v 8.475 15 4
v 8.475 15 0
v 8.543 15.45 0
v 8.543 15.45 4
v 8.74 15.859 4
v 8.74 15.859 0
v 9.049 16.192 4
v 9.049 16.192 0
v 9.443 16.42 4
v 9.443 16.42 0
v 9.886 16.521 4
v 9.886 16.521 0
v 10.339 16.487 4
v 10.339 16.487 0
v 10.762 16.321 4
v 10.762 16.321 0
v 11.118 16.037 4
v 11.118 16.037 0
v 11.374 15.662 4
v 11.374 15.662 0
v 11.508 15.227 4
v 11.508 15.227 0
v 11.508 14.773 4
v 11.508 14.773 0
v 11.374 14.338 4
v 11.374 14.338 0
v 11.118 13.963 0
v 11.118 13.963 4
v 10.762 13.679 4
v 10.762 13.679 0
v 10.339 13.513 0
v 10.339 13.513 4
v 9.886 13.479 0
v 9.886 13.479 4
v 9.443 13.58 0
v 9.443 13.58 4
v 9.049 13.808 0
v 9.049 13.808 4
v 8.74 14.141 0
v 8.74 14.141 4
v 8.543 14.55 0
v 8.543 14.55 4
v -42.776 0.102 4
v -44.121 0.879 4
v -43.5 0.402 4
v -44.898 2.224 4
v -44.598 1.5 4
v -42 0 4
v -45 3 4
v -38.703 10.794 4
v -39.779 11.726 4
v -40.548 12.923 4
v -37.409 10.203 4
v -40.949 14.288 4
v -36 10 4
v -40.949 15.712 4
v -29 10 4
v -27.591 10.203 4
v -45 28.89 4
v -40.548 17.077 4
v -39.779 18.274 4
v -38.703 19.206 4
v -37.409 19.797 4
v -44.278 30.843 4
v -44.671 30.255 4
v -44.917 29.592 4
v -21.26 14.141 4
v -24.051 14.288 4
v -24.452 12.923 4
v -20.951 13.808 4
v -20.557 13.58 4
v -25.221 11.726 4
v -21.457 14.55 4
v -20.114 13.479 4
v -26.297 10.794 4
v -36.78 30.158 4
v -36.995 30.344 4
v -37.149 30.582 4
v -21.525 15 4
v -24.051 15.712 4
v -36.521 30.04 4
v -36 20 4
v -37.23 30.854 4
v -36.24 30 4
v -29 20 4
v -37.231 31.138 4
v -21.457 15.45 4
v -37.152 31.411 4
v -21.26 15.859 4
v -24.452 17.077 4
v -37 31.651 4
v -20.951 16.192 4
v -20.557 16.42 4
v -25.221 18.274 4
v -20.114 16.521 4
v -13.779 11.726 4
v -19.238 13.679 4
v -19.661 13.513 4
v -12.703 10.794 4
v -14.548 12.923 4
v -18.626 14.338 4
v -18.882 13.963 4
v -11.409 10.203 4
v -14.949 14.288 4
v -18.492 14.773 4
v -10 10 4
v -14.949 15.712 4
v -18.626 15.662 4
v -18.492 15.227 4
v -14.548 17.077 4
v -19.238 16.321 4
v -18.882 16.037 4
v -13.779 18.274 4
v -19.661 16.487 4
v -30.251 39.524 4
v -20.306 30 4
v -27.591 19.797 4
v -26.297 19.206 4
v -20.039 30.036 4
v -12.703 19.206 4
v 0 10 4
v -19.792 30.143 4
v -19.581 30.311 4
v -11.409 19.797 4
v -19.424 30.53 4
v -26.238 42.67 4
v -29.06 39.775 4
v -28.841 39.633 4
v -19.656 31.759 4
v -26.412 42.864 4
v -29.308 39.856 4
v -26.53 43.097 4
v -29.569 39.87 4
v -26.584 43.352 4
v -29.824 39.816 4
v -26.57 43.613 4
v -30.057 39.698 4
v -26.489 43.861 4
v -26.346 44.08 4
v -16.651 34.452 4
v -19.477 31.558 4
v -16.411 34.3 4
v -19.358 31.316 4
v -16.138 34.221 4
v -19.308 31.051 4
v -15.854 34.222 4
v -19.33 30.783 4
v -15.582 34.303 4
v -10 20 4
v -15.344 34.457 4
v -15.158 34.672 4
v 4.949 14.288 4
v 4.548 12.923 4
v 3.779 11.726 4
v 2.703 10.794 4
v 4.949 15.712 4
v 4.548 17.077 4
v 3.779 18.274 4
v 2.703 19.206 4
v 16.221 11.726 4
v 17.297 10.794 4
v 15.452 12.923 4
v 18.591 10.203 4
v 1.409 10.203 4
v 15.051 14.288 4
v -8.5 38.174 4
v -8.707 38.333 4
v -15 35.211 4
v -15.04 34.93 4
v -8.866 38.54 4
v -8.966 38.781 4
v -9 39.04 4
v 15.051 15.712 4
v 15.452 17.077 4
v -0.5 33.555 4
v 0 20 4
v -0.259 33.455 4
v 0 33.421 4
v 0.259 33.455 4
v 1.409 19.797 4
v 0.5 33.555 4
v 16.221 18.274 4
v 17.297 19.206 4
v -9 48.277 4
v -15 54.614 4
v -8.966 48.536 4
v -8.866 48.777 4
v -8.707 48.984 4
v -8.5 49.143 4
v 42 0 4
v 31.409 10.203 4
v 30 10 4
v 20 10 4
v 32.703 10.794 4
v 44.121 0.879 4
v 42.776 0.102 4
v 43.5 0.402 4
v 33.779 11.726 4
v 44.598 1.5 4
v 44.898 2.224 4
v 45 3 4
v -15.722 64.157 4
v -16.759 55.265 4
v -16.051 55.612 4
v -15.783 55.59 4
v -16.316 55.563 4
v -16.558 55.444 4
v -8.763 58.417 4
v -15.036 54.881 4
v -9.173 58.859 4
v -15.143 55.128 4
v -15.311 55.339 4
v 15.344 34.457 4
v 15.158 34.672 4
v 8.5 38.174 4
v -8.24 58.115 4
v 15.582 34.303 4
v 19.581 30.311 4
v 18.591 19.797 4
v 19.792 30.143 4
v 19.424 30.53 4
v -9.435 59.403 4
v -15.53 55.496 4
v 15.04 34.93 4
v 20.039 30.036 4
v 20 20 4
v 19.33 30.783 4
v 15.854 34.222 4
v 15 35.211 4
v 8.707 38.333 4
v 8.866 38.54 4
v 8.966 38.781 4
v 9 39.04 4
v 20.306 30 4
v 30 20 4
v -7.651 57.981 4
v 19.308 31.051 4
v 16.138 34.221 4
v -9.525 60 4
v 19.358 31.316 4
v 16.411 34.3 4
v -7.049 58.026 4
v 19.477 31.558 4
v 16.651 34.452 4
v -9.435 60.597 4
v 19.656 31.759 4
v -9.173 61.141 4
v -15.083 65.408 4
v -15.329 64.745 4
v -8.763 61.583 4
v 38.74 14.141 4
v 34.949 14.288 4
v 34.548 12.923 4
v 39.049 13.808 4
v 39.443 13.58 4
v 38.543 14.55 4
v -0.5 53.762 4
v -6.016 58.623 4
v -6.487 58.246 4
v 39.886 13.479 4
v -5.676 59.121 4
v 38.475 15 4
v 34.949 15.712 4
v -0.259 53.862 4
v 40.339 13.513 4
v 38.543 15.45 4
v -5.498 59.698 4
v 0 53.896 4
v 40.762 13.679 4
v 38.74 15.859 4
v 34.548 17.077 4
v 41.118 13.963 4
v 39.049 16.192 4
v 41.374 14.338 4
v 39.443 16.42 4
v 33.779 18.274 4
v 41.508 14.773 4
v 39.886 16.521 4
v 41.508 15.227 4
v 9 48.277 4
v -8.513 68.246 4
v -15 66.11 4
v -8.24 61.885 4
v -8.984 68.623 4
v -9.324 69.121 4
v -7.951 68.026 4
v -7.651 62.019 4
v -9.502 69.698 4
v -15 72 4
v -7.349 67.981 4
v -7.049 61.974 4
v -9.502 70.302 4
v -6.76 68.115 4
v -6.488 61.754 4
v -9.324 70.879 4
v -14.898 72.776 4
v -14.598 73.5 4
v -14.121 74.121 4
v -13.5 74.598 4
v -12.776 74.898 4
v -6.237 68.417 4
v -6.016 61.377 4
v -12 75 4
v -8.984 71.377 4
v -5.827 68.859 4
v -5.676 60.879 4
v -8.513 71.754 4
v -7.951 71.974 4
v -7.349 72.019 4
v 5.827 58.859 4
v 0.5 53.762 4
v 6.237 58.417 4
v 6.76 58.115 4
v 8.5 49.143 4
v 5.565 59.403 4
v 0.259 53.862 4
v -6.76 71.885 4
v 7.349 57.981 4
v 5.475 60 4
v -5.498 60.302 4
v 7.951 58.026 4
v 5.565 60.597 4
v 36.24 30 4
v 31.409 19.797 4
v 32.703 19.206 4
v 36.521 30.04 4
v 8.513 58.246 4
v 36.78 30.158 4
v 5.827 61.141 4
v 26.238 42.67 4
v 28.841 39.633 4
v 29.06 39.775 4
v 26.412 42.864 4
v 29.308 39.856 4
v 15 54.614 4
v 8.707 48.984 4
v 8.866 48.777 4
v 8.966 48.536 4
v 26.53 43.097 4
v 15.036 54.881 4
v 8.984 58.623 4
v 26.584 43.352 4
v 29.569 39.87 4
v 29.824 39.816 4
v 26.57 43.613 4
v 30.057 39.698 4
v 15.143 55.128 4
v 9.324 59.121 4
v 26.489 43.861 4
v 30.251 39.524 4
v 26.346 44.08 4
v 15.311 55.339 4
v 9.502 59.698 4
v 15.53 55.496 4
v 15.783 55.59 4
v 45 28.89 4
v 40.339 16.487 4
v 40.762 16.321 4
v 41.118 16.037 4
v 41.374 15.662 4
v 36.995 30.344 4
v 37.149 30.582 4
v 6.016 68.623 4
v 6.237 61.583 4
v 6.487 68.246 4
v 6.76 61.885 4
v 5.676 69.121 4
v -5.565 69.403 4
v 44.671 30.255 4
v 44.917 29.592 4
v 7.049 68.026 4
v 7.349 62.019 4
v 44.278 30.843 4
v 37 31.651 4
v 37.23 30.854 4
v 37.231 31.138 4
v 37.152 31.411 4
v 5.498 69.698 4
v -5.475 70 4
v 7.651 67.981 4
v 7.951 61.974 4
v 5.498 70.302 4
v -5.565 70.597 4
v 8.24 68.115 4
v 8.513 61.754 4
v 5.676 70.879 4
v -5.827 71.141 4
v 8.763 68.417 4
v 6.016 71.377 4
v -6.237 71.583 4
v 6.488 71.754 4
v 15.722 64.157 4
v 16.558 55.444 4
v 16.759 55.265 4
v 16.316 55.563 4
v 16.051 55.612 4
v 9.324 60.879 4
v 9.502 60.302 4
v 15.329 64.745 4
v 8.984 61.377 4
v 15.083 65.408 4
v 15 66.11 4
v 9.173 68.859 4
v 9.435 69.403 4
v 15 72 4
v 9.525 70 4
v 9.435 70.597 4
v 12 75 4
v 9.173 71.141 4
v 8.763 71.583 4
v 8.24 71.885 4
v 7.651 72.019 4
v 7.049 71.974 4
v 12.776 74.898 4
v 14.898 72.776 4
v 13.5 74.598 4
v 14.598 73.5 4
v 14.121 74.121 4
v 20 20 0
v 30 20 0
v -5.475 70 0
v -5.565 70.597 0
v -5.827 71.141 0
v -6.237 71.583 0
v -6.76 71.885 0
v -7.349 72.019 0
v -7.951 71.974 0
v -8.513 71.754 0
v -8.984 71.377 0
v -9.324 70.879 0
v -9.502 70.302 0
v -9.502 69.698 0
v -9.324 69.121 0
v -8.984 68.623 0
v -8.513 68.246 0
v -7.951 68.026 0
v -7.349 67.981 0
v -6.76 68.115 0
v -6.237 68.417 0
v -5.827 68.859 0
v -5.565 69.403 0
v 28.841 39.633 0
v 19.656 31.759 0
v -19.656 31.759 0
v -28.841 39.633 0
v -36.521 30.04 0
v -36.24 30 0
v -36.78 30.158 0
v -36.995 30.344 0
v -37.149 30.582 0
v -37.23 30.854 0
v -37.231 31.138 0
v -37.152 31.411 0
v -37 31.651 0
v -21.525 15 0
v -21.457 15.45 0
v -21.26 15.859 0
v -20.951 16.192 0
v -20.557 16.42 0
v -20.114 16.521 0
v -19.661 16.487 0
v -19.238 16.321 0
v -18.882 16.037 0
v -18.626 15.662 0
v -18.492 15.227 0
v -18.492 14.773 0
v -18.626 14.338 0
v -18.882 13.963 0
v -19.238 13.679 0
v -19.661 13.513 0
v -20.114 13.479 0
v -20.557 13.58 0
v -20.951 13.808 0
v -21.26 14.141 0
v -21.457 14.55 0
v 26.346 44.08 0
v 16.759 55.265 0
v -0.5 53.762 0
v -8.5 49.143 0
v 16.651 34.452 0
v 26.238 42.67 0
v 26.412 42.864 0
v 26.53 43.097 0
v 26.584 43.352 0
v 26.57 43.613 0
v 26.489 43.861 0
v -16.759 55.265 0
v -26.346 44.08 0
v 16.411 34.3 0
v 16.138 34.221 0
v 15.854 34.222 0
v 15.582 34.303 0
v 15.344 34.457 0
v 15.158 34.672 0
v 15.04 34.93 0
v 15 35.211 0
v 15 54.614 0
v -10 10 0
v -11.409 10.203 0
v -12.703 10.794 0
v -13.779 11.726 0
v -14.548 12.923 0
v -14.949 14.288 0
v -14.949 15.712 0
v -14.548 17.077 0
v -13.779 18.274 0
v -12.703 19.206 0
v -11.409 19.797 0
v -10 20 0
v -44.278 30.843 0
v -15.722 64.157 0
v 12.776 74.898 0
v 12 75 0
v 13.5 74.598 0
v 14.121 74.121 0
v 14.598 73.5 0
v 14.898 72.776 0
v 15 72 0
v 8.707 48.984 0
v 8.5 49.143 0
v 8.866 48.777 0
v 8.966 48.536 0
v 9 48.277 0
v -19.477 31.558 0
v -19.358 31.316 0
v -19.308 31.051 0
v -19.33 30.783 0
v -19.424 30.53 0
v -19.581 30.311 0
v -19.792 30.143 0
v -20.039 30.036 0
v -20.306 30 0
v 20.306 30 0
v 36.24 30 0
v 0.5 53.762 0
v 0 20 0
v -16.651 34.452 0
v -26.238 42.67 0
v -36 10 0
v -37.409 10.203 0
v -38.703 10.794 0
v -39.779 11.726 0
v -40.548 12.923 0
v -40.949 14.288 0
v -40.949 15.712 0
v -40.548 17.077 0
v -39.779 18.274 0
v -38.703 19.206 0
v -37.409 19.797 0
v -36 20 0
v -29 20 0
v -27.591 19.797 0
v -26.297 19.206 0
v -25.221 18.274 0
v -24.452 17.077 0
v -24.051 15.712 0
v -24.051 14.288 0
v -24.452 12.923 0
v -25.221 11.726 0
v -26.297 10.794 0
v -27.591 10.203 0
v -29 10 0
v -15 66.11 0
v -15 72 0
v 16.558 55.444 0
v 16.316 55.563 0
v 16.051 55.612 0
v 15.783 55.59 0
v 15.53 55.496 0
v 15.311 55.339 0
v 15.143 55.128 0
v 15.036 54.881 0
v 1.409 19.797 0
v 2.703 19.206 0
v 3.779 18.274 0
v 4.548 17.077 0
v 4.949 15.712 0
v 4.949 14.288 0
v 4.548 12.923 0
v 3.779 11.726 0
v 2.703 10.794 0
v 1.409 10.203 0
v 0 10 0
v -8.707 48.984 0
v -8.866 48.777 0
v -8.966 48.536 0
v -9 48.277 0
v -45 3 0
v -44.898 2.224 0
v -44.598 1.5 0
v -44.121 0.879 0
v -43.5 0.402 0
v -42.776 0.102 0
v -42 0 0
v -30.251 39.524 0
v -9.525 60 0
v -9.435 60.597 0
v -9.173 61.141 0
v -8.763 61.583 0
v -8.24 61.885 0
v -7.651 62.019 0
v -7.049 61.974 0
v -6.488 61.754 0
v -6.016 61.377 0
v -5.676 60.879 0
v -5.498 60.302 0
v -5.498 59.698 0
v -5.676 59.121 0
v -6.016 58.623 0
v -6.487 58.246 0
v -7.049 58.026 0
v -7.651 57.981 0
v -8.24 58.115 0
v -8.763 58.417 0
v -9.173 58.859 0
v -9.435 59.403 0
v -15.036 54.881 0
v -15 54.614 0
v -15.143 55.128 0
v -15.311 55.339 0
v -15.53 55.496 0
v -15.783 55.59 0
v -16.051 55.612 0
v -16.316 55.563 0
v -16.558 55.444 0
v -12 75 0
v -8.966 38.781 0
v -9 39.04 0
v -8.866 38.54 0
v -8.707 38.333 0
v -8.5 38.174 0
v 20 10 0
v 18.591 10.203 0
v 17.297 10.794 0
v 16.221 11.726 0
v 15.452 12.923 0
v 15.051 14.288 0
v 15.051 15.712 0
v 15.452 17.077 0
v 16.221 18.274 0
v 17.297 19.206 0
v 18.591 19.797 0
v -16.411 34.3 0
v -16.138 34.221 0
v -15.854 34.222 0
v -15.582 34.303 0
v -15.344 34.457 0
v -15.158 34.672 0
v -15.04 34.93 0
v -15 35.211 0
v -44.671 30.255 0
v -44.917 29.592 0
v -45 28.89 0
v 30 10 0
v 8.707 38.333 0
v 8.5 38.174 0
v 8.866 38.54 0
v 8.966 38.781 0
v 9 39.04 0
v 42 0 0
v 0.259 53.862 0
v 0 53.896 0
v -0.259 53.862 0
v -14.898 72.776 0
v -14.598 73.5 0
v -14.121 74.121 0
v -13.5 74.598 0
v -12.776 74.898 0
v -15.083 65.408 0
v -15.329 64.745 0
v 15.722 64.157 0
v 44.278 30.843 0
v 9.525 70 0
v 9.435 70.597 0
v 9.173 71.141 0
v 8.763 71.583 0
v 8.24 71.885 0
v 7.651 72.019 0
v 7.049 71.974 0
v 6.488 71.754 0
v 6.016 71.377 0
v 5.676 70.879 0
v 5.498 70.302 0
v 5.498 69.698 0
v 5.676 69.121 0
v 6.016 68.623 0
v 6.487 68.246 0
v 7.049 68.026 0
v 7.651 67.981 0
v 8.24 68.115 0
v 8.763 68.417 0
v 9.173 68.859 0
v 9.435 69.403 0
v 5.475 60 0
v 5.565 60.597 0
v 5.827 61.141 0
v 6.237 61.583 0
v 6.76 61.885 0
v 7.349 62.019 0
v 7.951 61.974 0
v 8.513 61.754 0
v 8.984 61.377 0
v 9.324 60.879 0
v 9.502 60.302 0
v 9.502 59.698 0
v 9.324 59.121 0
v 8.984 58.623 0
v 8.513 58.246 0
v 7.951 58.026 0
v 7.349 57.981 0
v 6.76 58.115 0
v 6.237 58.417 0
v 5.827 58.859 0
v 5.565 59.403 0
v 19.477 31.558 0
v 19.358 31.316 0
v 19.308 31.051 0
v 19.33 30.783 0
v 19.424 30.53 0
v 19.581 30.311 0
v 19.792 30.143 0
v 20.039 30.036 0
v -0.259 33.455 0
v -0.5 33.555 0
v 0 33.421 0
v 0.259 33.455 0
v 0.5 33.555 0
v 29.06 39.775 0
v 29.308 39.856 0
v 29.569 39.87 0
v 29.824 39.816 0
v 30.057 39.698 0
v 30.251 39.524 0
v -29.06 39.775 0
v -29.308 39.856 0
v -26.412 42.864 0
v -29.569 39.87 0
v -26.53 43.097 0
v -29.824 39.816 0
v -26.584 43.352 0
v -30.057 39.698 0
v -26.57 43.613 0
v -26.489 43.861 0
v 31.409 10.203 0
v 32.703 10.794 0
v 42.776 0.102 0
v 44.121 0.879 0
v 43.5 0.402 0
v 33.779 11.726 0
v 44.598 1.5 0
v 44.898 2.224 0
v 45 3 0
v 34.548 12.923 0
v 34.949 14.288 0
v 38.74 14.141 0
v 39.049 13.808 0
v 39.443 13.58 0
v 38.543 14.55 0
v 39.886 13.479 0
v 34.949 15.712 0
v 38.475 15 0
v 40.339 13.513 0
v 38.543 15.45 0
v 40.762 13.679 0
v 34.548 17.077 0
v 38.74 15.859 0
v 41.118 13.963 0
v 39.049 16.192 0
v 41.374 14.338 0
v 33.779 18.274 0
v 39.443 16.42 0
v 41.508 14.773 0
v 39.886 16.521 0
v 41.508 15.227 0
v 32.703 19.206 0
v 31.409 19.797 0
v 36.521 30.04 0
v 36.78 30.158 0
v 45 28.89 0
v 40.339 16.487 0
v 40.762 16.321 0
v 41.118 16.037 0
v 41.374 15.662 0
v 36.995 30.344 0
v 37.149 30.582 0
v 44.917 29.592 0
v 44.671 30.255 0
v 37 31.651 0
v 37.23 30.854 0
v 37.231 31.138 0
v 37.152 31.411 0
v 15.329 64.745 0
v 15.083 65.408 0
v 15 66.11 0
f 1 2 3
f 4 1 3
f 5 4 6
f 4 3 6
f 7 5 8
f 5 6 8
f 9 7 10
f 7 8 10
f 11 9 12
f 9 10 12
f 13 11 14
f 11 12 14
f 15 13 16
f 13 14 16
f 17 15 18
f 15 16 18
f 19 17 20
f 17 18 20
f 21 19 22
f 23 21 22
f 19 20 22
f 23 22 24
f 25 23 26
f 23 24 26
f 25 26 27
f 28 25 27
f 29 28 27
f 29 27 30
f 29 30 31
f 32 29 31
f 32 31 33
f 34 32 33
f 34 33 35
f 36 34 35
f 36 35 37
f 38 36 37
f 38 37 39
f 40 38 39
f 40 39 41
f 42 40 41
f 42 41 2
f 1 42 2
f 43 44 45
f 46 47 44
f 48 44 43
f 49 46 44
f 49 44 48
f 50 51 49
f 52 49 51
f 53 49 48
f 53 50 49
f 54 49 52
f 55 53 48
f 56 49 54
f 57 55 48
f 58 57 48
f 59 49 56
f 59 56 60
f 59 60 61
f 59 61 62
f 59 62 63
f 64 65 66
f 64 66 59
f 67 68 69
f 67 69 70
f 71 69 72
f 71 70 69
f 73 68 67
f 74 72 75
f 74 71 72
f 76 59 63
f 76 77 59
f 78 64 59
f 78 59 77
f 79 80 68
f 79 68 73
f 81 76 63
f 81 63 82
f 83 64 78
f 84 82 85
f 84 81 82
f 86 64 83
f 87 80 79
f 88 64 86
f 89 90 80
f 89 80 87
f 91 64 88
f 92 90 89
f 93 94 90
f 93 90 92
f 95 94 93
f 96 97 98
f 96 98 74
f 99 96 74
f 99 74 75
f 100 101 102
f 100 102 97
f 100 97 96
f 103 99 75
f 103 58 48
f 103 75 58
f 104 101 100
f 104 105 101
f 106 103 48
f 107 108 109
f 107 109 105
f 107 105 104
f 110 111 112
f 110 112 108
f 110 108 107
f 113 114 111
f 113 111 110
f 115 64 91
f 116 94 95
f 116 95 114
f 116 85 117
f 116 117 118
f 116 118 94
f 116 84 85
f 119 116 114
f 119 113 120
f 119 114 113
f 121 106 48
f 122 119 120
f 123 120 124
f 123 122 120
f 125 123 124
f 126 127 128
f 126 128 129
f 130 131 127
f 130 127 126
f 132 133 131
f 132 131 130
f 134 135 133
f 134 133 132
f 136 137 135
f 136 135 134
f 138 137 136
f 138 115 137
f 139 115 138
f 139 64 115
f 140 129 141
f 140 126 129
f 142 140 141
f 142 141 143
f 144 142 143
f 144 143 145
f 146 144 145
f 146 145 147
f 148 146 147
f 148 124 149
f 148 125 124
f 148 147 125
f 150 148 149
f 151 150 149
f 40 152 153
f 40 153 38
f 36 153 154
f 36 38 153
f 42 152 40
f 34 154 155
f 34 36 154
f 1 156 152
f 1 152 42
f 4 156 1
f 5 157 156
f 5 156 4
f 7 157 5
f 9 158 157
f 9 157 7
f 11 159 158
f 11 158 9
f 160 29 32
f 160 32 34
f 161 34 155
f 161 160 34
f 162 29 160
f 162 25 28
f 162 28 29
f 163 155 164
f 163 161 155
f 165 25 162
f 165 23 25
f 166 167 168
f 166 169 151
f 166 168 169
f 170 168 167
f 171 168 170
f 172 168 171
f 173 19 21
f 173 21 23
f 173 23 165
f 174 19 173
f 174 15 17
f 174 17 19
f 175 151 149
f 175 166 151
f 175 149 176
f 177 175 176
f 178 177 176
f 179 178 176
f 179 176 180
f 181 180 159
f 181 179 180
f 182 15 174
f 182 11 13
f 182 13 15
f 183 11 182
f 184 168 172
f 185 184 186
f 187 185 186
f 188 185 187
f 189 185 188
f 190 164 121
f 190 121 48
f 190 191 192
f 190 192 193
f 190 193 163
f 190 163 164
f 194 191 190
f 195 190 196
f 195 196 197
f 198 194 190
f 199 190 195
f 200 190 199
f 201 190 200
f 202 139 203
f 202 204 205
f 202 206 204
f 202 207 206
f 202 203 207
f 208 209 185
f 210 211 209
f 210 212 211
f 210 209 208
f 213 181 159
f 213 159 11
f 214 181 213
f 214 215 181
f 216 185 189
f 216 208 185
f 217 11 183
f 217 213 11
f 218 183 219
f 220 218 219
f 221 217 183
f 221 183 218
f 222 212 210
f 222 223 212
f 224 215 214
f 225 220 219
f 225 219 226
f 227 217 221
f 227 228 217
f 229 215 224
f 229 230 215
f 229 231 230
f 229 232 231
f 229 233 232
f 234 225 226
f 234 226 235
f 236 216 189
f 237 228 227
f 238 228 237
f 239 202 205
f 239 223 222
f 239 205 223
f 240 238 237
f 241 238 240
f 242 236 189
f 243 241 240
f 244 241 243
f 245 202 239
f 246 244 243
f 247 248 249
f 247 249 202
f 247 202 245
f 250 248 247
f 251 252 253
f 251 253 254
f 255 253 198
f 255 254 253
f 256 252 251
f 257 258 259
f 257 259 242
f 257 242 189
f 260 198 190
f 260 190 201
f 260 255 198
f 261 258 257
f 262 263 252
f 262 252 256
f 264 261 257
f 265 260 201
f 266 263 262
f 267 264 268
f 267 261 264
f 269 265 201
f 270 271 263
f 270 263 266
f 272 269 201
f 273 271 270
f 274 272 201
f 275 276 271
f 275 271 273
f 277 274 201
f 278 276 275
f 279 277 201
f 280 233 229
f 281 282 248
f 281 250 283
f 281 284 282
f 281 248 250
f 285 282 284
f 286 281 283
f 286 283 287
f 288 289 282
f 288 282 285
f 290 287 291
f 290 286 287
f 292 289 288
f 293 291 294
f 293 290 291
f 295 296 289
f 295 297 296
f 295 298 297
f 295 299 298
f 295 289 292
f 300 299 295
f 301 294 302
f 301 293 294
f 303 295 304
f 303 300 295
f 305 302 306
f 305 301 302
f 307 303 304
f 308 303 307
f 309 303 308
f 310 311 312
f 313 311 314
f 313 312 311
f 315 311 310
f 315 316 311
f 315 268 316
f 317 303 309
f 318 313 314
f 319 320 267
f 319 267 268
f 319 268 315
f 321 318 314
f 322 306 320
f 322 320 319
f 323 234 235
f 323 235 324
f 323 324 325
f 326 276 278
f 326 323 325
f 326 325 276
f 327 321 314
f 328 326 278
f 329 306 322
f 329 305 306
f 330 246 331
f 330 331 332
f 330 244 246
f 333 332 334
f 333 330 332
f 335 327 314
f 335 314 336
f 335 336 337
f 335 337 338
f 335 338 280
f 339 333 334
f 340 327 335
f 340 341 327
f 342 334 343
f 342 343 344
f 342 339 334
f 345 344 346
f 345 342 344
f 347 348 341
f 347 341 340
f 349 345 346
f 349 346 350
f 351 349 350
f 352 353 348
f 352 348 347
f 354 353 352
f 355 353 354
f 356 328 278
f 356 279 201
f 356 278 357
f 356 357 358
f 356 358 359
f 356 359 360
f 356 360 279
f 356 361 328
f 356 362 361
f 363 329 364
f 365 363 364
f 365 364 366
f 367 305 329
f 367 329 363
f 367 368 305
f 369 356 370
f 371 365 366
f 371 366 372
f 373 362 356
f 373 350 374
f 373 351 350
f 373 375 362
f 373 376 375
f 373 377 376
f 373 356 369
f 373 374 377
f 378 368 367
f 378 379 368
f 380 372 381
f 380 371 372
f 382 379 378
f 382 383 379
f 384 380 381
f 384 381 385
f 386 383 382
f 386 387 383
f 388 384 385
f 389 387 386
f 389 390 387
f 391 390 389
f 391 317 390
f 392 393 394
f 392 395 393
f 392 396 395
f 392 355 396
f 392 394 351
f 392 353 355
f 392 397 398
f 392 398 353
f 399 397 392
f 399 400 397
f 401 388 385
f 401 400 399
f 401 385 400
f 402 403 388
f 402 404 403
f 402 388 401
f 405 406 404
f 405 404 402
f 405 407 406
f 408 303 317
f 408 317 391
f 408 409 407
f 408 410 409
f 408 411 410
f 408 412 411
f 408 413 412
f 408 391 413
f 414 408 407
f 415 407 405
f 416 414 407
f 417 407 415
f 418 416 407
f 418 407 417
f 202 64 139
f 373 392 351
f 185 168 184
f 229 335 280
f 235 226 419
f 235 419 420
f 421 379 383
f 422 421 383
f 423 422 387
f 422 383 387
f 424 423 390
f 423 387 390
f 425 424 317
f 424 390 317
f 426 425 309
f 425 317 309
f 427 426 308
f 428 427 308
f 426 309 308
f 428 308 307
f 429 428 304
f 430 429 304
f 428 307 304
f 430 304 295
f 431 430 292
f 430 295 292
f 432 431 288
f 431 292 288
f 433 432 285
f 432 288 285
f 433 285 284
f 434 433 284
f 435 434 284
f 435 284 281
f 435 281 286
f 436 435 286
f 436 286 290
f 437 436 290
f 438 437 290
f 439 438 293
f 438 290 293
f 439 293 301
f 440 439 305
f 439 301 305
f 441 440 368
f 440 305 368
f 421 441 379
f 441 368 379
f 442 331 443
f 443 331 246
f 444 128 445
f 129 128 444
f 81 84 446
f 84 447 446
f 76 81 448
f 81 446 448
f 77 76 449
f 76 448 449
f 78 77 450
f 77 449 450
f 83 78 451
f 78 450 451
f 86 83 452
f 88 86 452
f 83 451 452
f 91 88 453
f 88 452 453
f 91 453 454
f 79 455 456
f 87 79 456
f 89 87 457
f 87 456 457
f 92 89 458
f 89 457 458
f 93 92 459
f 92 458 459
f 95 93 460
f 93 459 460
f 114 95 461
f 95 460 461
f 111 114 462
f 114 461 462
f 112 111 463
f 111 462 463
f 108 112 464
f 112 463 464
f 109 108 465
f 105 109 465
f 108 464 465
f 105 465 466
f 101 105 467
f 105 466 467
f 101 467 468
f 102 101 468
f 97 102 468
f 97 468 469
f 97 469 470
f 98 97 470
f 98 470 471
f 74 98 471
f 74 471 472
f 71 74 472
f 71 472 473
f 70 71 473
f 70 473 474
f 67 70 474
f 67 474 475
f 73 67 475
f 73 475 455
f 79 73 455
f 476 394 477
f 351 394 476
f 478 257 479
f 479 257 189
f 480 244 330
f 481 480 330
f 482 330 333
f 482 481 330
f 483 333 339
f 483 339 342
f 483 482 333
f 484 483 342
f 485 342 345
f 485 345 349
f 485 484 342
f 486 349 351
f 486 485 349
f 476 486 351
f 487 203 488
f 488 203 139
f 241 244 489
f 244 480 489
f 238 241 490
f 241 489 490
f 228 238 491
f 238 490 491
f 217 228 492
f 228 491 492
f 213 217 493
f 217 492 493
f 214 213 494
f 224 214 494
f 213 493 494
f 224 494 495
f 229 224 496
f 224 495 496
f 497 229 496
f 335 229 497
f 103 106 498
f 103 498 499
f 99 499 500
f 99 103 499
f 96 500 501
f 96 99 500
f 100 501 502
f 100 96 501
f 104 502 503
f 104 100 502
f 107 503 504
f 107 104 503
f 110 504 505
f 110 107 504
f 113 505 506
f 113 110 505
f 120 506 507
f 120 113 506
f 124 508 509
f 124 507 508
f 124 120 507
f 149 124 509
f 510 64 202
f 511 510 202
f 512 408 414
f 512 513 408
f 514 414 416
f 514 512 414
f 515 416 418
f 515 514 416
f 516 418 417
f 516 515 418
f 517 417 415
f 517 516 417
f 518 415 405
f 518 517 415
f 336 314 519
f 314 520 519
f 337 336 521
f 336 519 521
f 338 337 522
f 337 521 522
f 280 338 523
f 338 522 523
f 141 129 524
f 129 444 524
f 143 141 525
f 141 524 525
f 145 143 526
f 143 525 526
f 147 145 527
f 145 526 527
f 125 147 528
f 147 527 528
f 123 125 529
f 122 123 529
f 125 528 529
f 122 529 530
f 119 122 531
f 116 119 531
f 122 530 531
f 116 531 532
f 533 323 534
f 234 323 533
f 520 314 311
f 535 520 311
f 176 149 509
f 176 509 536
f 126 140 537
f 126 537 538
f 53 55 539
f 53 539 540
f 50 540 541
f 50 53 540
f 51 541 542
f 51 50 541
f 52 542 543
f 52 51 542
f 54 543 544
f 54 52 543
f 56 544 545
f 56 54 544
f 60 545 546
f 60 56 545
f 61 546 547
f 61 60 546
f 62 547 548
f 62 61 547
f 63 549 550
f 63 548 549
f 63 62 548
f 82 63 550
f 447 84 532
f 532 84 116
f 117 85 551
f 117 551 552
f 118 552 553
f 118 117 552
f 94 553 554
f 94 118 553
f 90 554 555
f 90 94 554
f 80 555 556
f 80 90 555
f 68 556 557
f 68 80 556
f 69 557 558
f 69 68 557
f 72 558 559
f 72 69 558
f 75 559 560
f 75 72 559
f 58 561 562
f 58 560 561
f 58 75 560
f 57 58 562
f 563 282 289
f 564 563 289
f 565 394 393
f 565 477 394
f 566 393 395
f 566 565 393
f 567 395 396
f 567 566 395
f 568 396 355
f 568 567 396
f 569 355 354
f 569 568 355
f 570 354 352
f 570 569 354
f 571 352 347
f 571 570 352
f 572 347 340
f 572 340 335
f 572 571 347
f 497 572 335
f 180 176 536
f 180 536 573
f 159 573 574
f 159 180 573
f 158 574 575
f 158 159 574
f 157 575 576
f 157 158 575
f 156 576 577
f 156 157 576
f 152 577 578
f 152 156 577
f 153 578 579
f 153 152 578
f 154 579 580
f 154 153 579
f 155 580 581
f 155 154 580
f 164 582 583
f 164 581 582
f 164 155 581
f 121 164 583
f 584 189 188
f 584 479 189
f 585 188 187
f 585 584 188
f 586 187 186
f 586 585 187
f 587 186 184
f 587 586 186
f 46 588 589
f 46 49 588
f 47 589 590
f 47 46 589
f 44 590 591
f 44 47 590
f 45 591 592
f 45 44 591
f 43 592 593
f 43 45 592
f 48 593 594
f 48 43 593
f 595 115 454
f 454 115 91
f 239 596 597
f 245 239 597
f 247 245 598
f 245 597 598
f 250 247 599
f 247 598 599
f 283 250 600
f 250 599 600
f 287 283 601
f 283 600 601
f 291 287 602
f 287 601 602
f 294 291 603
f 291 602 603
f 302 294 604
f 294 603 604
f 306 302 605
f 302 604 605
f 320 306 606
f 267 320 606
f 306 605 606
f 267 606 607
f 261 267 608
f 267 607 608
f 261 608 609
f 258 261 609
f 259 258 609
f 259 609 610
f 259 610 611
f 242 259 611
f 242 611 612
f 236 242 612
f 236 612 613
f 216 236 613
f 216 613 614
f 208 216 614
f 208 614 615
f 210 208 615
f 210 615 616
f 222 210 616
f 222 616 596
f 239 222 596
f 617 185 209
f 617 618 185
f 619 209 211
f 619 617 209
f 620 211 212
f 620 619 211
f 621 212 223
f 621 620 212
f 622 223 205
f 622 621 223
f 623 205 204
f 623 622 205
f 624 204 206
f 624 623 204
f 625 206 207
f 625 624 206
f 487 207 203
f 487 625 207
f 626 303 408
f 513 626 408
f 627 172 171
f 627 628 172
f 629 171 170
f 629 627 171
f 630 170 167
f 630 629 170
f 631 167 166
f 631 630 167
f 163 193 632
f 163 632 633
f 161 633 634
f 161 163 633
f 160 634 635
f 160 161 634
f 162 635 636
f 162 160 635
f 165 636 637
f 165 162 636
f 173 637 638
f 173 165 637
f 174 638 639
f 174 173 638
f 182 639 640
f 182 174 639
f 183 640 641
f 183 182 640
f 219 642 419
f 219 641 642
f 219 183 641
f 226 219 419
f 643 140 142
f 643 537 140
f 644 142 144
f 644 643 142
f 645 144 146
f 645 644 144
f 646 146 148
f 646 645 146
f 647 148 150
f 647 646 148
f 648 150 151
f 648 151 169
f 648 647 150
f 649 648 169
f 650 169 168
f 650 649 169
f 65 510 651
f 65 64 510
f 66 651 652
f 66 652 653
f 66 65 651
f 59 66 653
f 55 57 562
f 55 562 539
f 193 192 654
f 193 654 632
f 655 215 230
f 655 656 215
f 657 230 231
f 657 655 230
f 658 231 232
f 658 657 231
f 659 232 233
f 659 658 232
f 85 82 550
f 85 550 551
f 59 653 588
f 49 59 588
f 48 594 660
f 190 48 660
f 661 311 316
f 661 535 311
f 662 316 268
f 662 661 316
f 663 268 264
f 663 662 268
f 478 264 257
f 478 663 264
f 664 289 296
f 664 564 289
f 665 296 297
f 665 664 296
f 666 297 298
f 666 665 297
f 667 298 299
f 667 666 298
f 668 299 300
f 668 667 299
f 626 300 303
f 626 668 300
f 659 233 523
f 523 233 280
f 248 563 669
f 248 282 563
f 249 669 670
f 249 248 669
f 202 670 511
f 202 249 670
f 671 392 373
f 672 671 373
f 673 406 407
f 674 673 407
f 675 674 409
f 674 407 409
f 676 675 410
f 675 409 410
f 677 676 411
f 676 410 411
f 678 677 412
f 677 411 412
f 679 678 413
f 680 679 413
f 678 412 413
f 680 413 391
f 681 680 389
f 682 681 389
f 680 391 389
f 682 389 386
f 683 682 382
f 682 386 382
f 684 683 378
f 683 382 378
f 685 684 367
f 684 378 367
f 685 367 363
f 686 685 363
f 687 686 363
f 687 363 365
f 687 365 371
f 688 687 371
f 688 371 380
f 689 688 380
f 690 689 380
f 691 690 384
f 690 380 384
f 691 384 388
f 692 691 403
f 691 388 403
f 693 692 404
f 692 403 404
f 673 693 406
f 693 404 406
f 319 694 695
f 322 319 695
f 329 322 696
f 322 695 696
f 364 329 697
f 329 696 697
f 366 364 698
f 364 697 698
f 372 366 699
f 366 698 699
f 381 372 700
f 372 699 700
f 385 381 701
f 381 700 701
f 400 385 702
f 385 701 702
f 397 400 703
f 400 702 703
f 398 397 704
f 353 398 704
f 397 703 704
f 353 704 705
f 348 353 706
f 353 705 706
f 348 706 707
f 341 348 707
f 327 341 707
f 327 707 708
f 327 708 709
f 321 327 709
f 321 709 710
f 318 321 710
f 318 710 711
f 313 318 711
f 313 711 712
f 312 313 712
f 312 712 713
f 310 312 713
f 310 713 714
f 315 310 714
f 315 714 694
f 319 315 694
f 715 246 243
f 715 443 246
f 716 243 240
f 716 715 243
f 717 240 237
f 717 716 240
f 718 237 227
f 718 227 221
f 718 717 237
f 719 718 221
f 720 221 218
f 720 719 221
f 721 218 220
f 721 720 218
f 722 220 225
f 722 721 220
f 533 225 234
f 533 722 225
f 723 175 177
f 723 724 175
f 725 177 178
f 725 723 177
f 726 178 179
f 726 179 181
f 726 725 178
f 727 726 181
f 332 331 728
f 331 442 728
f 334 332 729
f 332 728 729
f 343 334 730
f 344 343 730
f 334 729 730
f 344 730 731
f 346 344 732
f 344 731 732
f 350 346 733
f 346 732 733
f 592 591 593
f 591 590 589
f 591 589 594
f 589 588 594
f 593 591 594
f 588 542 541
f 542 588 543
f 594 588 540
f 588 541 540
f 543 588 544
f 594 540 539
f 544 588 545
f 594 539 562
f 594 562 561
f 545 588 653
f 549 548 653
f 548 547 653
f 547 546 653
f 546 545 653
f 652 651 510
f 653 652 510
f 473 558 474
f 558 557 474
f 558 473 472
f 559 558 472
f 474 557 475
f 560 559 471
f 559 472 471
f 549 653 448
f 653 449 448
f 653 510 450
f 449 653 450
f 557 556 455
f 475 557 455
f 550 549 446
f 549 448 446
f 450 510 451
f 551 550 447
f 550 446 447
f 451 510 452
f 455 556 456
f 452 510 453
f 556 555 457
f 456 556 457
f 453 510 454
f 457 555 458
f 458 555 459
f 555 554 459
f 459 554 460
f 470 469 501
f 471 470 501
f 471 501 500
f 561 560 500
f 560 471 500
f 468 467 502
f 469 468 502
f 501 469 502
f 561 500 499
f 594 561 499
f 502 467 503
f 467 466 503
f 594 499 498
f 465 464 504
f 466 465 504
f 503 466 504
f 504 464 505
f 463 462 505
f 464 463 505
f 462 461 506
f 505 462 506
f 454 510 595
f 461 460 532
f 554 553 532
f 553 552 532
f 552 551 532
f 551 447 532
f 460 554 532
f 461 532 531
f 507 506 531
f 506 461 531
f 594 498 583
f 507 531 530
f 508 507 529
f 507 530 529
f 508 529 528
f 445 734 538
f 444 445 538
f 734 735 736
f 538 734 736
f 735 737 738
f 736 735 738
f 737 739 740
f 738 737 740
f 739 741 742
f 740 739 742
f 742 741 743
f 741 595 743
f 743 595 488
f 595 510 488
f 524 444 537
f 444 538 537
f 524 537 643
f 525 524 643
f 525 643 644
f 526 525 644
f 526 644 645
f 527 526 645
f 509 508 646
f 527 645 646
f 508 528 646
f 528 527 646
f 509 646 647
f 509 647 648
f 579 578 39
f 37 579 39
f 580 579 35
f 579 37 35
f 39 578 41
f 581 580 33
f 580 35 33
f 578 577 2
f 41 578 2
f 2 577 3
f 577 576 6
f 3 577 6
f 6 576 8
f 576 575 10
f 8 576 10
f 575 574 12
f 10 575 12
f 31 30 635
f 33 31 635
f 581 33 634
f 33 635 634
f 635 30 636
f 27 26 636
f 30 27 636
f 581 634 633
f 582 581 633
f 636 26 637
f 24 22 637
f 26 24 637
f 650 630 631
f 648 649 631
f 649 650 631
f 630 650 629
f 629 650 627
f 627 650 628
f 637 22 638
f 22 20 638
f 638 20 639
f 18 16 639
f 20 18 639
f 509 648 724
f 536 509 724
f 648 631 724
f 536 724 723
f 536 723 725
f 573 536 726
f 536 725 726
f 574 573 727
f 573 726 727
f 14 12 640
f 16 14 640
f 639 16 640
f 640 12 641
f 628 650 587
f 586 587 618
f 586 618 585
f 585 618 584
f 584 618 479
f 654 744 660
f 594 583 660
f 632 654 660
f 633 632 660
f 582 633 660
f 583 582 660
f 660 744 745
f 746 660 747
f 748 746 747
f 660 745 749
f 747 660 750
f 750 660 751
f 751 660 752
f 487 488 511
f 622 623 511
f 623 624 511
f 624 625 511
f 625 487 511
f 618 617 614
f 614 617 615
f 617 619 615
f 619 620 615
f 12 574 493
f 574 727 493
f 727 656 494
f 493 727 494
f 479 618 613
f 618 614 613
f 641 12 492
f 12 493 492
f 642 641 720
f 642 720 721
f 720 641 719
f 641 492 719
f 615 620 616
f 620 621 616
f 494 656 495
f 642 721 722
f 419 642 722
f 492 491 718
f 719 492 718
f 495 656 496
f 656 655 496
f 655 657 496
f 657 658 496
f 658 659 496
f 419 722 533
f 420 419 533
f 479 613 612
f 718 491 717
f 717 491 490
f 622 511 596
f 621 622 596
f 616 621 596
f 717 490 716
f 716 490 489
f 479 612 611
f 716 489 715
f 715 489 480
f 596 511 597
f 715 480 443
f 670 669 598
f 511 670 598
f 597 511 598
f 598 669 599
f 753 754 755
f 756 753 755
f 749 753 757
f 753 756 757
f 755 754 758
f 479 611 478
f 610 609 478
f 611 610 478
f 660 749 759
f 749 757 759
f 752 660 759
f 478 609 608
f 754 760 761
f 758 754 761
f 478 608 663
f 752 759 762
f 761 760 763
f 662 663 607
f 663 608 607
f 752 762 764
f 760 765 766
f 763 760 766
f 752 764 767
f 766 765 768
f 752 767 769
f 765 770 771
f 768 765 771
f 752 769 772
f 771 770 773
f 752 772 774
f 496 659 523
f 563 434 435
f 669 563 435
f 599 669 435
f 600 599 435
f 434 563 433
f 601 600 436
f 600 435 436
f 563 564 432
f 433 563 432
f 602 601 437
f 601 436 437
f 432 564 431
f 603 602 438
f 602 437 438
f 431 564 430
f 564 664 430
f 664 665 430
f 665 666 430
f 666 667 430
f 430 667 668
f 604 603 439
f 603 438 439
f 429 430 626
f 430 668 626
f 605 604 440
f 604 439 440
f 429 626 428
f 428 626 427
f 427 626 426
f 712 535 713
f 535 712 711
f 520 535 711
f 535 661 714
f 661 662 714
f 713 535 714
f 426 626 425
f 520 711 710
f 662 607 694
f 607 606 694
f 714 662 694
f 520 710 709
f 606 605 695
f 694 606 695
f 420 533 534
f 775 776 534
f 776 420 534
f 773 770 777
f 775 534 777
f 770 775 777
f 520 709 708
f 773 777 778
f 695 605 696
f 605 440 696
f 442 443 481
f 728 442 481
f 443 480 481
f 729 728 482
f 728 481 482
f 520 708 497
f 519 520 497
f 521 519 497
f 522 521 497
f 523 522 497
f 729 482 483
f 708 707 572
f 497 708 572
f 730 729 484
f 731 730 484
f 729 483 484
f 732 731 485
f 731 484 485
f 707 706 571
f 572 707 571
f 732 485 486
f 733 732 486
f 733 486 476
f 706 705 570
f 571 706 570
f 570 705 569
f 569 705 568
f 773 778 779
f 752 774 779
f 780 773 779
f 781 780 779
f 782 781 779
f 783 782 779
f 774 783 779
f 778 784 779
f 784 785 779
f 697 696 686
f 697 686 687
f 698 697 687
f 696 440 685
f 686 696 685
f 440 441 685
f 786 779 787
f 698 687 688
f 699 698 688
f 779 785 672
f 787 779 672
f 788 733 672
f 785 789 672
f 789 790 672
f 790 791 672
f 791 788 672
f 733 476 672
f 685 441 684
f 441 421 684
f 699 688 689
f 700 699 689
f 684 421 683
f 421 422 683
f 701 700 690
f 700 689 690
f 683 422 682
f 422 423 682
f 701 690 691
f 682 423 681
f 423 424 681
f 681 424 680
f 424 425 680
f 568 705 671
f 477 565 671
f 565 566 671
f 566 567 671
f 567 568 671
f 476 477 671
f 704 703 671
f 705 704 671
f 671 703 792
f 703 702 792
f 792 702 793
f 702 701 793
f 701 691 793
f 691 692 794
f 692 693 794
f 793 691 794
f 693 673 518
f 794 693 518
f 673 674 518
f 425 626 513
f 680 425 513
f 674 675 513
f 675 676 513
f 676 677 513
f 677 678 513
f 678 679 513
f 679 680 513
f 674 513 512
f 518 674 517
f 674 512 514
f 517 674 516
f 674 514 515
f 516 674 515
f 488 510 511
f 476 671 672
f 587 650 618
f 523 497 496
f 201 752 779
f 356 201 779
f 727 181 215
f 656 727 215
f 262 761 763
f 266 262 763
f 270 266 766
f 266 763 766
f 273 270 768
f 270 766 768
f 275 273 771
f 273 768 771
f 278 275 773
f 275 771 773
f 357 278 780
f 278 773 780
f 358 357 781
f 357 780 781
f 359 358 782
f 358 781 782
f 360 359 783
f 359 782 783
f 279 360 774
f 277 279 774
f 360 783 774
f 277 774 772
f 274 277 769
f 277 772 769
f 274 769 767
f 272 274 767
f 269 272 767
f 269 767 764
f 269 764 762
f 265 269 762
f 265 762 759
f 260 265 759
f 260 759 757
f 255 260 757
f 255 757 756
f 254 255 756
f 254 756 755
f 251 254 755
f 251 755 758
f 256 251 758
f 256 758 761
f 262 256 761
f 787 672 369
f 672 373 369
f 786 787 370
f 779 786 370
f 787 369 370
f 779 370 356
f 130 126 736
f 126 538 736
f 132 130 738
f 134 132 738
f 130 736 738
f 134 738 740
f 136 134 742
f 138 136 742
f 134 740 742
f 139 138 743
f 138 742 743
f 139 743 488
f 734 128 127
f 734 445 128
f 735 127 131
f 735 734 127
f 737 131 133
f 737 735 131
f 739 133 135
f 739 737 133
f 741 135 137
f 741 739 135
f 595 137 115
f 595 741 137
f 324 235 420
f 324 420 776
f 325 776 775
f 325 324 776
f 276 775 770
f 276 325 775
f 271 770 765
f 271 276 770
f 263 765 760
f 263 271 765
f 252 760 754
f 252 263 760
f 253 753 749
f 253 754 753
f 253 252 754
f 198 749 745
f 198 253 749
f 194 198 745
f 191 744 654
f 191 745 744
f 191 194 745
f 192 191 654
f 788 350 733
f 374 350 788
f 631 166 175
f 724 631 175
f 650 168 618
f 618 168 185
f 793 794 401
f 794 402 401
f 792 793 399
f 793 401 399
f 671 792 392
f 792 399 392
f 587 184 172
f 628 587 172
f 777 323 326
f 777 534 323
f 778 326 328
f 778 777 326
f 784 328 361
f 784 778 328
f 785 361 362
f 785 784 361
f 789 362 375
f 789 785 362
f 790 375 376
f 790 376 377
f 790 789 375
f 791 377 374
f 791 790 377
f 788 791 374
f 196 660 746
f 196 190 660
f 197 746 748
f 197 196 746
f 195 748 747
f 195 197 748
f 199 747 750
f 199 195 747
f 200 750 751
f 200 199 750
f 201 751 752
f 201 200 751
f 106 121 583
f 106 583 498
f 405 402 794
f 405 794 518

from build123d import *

# Parameters (mm, degrees)
EXTRUDE_1_DEPTH          = 4
EXTRUDE_2_DEPTH          = 4
CUT_EXTRUDE_2_DEPTH      = 4
CUT_EXTRUDE_3_DEPTH      = 4
SKETCH_8_R               = 1.525
CUT_EXTRUDE_4_DEPTH      = 10
SKETCH_9_R               = 2.025
CUT_EXTRUDE_5_DEPTH      = 10
CUT_EXTRUDE_6_DEPTH      = 1
CUT_EXTRUDE_6_DEPTH_BACK = 5
SKETCH_11_W              = 30
SKETCH_11_H              = 10
SKETCH_11_R              = 2.025
EXTRUDE_3_DEPTH          = 4
FILLET_2_R               = 3
EXTRUDE_4_DEPTH          = 4
FILLET_3_R               = 1


with BuildPart() as part:
    # 草图1 → 凸台-拉伸1 (new body)
    with BuildSketch(Plane.XY):
        Polygon((-45, 0), (45, 0), (45, 30), (15, 30), (15, 65), (-15, 65), (-15, 30), (-45, 30), align=None)
    extrude(amount=EXTRUDE_1_DEPTH)

    # 草图4 → 凸台-拉伸2 (add)
    with BuildSketch(Plane.XY.offset(4)):
        Polygon((-45, 30), (-15, 65), (-15, 30), align=None)
        Polygon((15, 65), (45, 30), (15, 30), align=None)
    extrude(amount=-EXTRUDE_2_DEPTH)

    # 草图5 → 切除-拉伸2 (cut)
    with BuildSketch(Plane.XY.offset(4)):
        Polygon((-38.414611102, 30), (-15, 30), (-15, 57.317046286), align=None)
        Polygon((15, 57.317046286), (38.414611102, 30), (15, 30), align=None)
    extrude(amount=-CUT_EXTRUDE_2_DEPTH, mode=Mode.SUBTRACT)

    # 草图6 → 切除-拉伸3 (cut)
    with BuildSketch(Plane.XY.offset(4)):
        Polygon((0, 54.050827988), (-9, 48.854675566), (-9, 38.46237072), (0, 33.266218297), (9, 38.46237072), (9, 48.854675566), align=None)
    extrude(amount=-CUT_EXTRUDE_3_DEPTH, mode=Mode.SUBTRACT)

    # 草图8 → 切除-拉伸4 (cut)
    with BuildSketch(Plane(origin=(0, 0, 0), x_dir=(-1, 0, 0), z_dir=(0, 0, -1))):
        with Locations((20.000000001, 14.999999905)):
            Circle(SKETCH_8_R)
        with Locations((-9.999999999, 14.999999905)):
            Circle(SKETCH_8_R)
        with Locations((-39.999999999, 14.999999905)):
            Circle(SKETCH_8_R)
    extrude(amount=-CUT_EXTRUDE_4_DEPTH, mode=Mode.SUBTRACT)

    # 草图9 → 切除-拉伸5 (cut)
    with BuildSketch(Plane(origin=(0, 0, 0), x_dir=(-1, 0, 0), z_dir=(0, 0, -1))):
        with Locations((-7.5, 60)):
            Circle(SKETCH_9_R)
        with Locations((7.5, 60)):
            Circle(SKETCH_9_R)
    extrude(amount=-CUT_EXTRUDE_5_DEPTH, mode=Mode.SUBTRACT)

    # 草图10 → 切除-拉伸6 (cut, two sides)
    with BuildSketch(Plane.XY.offset(4)) as cut_extrude_6_sk:
        with BuildLine():
            Line((-10.000000001, 19.999999905), (-1e-09, 19.999999905))
            ThreePointArc((-1e-09, 19.999999905), (4.999999999, 14.999999905), (-1e-09, 9.999999905))
            Line((-1e-09, 9.999999905), (-10.000000001, 9.999999905))
            ThreePointArc((-10.000000001, 9.999999905), (-15.000000001, 14.999999905), (-10.000000001, 19.999999905))
        make_face()
        with BuildLine():
            Line((19.999999999, 19.999999905), (29.999999999, 19.999999905))
            ThreePointArc((29.999999999, 19.999999905), (34.999999999, 14.999999905), (29.999999999, 9.999999905))
            Line((29.999999999, 9.999999905), (19.999999999, 9.999999905))
            ThreePointArc((19.999999999, 9.999999905), (14.999999999, 14.999999905), (19.999999999, 19.999999905))
        make_face()
        with BuildLine():
            Line((-36, 19.999999905), (-29, 19.999999905))
            ThreePointArc((-29, 19.999999905), (-24, 14.999999905), (-29, 9.999999905))
            Line((-29, 9.999999905), (-36, 9.999999905))
            ThreePointArc((-36, 9.999999905), (-41, 14.999999905), (-36, 19.999999905))
        make_face()
    extrude(amount=CUT_EXTRUDE_6_DEPTH, mode=Mode.SUBTRACT)
    extrude(cut_extrude_6_sk.sketch, amount=-CUT_EXTRUDE_6_DEPTH_BACK, mode=Mode.SUBTRACT)

    # 草图11 → 凸台-拉伸3 (add)
    with BuildSketch(Plane.XY.offset(4)):
        with Locations((0, 70)):
            Rectangle(SKETCH_11_W, SKETCH_11_H)
        with Locations((7.5, 70)):
            Circle(SKETCH_11_R, mode=Mode.SUBTRACT)
        with Locations((-7.5, 70)):
            Circle(SKETCH_11_R, mode=Mode.SUBTRACT)
    extrude(amount=-EXTRUDE_3_DEPTH)

    # 圆角2
    fillet_2_edges = [part.edges().sort_by_distance(p)[0] for p in [
        (-45, 30, 2),
        (-15, 65, 2),
        (15, 65, 2),
        (45, 30, 2),
        (45, 0, 2),
        (-45, 0, 2),
        (15, 75, 2),
        (-15, 75, 2),
    ]]
    fillet(fillet_2_edges, radius=FILLET_2_R)

    # 草图13 → 凸台-拉伸4 (add)
    with BuildSketch(Plane.XY.offset(4)):
        Polygon((15, 33.037026409), (26.997186292, 43.320328945), (29.600351786, 40.283302536), (17.603165494, 30), (15, 30), align=None)
    extrude_4 = extrude(amount=-EXTRUDE_4_DEPTH)

    # 镜向1: 凸台-拉伸4 across plane
    add(extrude_4.mirror(Plane(origin=(0, 0, 0), x_dir=(0, 0, 1), z_dir=(1, 0, 0))))

    # 圆角3
    fillet_3_edges = [part.edges().sort_by_distance(p)[0] for p in [
        (15, 33.037026409, 2),
        (26.997186292, 43.320328945, 2),
        (29.600351786, 40.283302536, 2),
        (17.603165494, 30, 2),
        (-26.997186292, 43.320328945, 2),
        (-29.600351786, 40.283302536, 2),
        (-17.603165494, 30, 2),
        (-15, 33.037026409, 2),
        (-38.414611102, 30, 2),
        (-15, 57.317046286, 2),
        (15, 57.317046286, 2),
        (38.414611102, 30, 2),
        (0, 54.050827988, 2),
        (9, 48.854675566, 2),
        (9, 38.46237072, 2),
        (0, 33.266218297, 2),
        (-9, 38.46237072, 2),
        (-9, 48.854675566, 2),
    ]]
    fillet(fillet_3_edges, radius=FILLET_3_R)


solid = part.part
